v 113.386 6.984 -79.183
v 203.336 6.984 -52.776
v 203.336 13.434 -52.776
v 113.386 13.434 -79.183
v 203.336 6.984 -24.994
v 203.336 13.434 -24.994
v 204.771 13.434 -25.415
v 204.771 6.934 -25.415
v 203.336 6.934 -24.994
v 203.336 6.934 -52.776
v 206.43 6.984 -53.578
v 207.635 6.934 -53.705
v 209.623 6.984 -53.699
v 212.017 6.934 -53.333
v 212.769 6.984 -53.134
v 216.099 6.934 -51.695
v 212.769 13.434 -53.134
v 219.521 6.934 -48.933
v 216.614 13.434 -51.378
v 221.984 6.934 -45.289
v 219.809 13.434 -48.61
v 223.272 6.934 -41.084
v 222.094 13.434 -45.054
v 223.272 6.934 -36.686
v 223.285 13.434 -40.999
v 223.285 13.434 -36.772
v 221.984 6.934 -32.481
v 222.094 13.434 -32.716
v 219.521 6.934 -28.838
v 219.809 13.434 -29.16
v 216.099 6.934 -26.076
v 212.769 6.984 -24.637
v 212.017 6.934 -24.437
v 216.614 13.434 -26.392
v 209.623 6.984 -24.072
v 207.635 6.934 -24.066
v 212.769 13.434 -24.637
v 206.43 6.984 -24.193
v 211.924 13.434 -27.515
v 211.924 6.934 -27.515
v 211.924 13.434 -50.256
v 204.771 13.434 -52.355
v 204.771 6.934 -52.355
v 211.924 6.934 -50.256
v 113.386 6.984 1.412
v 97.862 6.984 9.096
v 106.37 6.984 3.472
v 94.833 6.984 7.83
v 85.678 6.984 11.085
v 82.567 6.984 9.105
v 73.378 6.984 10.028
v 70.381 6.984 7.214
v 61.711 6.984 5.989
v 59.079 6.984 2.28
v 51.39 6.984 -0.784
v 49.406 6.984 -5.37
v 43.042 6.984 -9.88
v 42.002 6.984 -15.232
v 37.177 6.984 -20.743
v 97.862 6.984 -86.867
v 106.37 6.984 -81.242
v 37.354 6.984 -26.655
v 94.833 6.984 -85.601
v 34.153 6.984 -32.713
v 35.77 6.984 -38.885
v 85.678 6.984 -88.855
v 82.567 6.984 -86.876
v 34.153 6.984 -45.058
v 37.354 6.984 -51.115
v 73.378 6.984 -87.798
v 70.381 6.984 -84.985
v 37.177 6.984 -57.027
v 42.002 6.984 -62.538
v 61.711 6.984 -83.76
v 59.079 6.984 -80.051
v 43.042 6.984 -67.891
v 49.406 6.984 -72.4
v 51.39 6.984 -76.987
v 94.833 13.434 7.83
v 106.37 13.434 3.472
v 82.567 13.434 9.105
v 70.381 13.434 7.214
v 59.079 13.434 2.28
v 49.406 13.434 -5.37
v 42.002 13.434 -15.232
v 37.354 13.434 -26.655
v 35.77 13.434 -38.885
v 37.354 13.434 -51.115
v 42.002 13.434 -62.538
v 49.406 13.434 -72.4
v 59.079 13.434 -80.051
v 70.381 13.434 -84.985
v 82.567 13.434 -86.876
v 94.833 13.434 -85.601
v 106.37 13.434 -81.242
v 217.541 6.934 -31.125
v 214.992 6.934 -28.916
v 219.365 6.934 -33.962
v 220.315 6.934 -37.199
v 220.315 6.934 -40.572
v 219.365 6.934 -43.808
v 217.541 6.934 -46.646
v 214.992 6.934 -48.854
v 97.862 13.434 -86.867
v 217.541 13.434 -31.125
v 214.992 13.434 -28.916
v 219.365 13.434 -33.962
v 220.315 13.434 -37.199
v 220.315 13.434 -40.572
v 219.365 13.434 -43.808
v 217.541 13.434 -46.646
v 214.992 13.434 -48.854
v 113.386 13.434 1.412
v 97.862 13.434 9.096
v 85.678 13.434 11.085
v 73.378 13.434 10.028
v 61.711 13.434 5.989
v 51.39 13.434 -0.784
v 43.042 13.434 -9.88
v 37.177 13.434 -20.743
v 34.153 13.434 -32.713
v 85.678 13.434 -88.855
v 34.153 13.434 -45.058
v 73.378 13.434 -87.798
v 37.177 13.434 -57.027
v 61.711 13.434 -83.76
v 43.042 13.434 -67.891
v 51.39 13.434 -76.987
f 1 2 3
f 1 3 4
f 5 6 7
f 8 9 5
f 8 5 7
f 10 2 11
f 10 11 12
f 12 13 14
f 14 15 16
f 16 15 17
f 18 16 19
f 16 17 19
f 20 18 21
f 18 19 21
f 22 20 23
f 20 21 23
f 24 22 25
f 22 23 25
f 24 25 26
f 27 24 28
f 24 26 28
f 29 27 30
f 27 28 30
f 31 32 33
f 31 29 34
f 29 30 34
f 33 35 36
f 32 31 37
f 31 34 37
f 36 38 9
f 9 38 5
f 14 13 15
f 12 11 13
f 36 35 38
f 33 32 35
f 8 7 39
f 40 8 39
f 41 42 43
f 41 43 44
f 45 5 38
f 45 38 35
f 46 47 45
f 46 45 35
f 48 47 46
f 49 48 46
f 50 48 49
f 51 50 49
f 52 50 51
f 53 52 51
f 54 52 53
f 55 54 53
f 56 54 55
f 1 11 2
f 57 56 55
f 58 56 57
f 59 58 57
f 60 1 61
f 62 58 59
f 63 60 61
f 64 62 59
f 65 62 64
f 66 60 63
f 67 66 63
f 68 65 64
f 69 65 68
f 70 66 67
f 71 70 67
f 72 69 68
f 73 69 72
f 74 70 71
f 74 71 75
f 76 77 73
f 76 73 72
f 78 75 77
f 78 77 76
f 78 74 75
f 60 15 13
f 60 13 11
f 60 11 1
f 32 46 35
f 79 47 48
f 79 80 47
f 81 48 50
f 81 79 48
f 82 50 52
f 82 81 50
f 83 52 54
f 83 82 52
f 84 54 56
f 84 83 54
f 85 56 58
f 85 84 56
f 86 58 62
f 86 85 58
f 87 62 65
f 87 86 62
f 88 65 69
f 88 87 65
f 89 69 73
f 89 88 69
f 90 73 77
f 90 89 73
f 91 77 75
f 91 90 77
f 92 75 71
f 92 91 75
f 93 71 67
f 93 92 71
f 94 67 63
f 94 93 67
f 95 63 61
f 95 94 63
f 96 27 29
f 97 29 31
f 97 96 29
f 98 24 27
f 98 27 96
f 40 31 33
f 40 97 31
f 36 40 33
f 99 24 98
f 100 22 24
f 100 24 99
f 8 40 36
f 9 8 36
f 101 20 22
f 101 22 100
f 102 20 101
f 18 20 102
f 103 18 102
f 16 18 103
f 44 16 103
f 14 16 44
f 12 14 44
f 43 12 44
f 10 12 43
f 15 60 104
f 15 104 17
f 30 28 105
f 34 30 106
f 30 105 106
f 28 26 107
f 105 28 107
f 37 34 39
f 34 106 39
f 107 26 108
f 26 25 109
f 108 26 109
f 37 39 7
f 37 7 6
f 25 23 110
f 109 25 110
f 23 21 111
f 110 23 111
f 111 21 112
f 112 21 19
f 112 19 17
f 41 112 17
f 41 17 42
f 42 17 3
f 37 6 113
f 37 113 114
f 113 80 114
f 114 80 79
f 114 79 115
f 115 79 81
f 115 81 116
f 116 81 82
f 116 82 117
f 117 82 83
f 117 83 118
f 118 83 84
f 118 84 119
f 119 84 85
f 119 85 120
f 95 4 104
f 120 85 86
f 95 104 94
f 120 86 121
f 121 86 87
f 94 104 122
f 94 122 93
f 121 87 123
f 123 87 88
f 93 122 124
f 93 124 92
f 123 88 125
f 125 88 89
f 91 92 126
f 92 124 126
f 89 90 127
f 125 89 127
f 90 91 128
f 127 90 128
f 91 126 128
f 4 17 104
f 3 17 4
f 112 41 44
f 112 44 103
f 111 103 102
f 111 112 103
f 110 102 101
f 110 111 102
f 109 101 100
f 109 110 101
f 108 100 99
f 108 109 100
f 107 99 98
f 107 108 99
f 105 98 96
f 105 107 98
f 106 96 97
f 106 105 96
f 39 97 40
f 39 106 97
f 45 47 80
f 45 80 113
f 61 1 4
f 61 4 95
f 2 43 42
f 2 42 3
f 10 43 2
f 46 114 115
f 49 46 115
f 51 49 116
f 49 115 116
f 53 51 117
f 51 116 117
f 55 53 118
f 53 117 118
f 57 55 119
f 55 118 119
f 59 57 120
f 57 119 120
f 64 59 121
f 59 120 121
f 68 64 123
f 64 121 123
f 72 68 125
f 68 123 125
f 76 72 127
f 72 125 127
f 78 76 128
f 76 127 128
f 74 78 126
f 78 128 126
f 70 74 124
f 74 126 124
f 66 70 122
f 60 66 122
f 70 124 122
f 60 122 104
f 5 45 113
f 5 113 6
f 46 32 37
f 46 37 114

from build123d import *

# Parameters (mm, degrees)
SKETCH1_R               = 50.00602605
SKETCH1_R_2             = 48.00602605
BOSS_EXTRUDE1_DEPTH     = 6.45
EXTRUDE_THIN1_START     = 4.55
SKETCH2_R               = 14.85
SKETCH2_R_2             = 11.85
EXTRUDE_THIN1_DEPTH     = 6.5
BOSS_EXTRUDE2_DEPTH     = 6.45
CUT_EXTRUDE1_DEPTH      = 7.45
CUT_EXTRUDE2_DEPTH      = 7.5
CUT_EXTRUDE3_DEPTH      = 1
CUT_EXTRUDE3_DEPTH_BACK = 7.5


with BuildPart() as part:
    # Sketch1 → Boss-Extrude1 (new body)
    with BuildSketch(Plane(origin=(0, 13.433589084, 0), x_dir=(-1, 0, 0), z_dir=(0, -1, 0))):
        with Locations((-83.776404782, 38.885320672)):
            Circle(SKETCH1_R)
        with Locations((-83.776404782, 38.885320672)):
            Circle(SKETCH1_R_2, mode=Mode.SUBTRACT)
    extrude(amount=BOSS_EXTRUDE1_DEPTH)



with BuildPart() as body_2:
    # Sketch2 → Extrude-Thin1 (new body)
    with BuildSketch(Plane(origin=(0, 17.983589084, 0), x_dir=(-1, 0, 0), z_dir=(0, -1, 0)).offset(EXTRUDE_THIN1_START)):
        with Locations((-208.585951979, 38.885320672)):
            Circle(SKETCH2_R)
        with Locations((-208.585951979, 38.885320672)):
            Circle(SKETCH2_R_2, mode=Mode.SUBTRACT)
    extrude(amount=EXTRUDE_THIN1_DEPTH)


with BuildPart() as part_1:
    add(part.part)

    add(body_2.part)  # Boss-Extrude2 merges body 2
    # Sketch3 → Boss-Extrude2 (add)
    with BuildSketch(Plane(origin=(0, 6.983589084, 0), x_dir=(-1, 0, 0), z_dir=(0, -1, 0))):
        with BuildLine():
            Line((-97.861971102, 86.866561409), (-212.768861048, 53.134031902))
            ThreePointArc((-212.768861048, 53.134031902), (-208.023442769, 53.724663089), (-203.336355819, 52.776477576))
            Line((-203.336355819, 52.776477576), (-113.385956141, 79.182679265))
            ThreePointArc((-113.385956141, 79.182679265), (-105.95919853, 83.701905803), (-97.861971102, 86.866561409))
        make_face()
        with BuildLine():
            Line((-113.385956141, -1.412037922), (-203.336355819, 24.994163767))
            ThreePointArc((-203.336355819, 24.994163767), (-208.023442769, 24.045978254), (-212.768861048, 24.636609441))
            Line((-212.768861048, 24.636609441), (-97.861971102, -9.095920066))
            ThreePointArc((-97.861971102, -9.095920066), (-105.95919853, -5.93126446), (-113.385956141, -1.412037922))
        make_face()
    extrude(amount=-BOSS_EXTRUDE2_DEPTH)

    # Sketch4 → Cut-Extrude1 (cut, through all)
    with BuildSketch(Plane(origin=(0, 6.983589084, 0), x_dir=(-1, 0, 0), z_dir=(0, -1, 0))):
        with BuildLine():
            Line((-113.385956141, 79.182679265), (-106.369670763, 81.242408265))
            ThreePointArc((-106.369670763, 81.242408265), (-131.782430832, 38.885320672), (-106.369670763, -3.471766922))
            Line((-106.369670763, -3.471766922), (-113.385956141, -1.412037922))
            ThreePointArc((-113.385956141, -1.412037922), (-133.782430832, 38.885320672), (-113.385956141, 79.182679265))
        make_face()
    extrude(amount=-CUT_EXTRUDE1_DEPTH, mode=Mode.SUBTRACT)

    # Sketch5 → Cut-Extrude2 (cut, through all)
    with BuildSketch(Plane(origin=(0, 6.933589084, 0), x_dir=(-1, 0, 0), z_dir=(0, -1, 0))):
        with BuildLine():
            Line((-203.336355819, 24.994163767), (-204.770657455, 25.415223133))
            Line((-204.770657455, 25.415223133), (-204.770657455, 52.35541821))
            Line((-204.770657455, 52.35541821), (-203.336355819, 52.776477576))
            ThreePointArc((-203.336355819, 52.776477576), (-193.735951979, 38.885320672), (-203.336355819, 24.994163767))
        make_face()
    extrude(amount=-CUT_EXTRUDE2_DEPTH, mode=Mode.SUBTRACT)

    # Sketch6 → Cut-Extrude3 (cut, two sides)
    with BuildSketch(Plane(origin=(0, 13.433589084, 0), x_dir=(1, 0, 0), z_dir=(0, 1, 0))) as cut_extrude3_sk:
        with BuildLine():
            Line((204.770657455, 25.415223133), (211.923828913, 27.515136963))
            ThreePointArc((211.923828913, 27.515136963), (208.3355607, 27.037966359), (204.770657455, 27.666317699))
            Line((204.770657455, 27.666317699), (204.770657455, 25.415223133))
        make_face()
        with BuildLine():
            Line((204.770657455, 50.104323644), (204.770657455, 52.35541821))
            Line((204.770657455, 52.35541821), (211.923828913, 50.25550438))
            ThreePointArc((211.923828913, 50.25550438), (208.3355607, 50.732674984), (204.770657455, 50.104323644))
        make_face()
    extrude(amount=CUT_EXTRUDE3_DEPTH, mode=Mode.SUBTRACT)
    extrude(cut_extrude3_sk.sketch, amount=-CUT_EXTRUDE3_DEPTH_BACK, mode=Mode.SUBTRACT)


solid = part_1.part
